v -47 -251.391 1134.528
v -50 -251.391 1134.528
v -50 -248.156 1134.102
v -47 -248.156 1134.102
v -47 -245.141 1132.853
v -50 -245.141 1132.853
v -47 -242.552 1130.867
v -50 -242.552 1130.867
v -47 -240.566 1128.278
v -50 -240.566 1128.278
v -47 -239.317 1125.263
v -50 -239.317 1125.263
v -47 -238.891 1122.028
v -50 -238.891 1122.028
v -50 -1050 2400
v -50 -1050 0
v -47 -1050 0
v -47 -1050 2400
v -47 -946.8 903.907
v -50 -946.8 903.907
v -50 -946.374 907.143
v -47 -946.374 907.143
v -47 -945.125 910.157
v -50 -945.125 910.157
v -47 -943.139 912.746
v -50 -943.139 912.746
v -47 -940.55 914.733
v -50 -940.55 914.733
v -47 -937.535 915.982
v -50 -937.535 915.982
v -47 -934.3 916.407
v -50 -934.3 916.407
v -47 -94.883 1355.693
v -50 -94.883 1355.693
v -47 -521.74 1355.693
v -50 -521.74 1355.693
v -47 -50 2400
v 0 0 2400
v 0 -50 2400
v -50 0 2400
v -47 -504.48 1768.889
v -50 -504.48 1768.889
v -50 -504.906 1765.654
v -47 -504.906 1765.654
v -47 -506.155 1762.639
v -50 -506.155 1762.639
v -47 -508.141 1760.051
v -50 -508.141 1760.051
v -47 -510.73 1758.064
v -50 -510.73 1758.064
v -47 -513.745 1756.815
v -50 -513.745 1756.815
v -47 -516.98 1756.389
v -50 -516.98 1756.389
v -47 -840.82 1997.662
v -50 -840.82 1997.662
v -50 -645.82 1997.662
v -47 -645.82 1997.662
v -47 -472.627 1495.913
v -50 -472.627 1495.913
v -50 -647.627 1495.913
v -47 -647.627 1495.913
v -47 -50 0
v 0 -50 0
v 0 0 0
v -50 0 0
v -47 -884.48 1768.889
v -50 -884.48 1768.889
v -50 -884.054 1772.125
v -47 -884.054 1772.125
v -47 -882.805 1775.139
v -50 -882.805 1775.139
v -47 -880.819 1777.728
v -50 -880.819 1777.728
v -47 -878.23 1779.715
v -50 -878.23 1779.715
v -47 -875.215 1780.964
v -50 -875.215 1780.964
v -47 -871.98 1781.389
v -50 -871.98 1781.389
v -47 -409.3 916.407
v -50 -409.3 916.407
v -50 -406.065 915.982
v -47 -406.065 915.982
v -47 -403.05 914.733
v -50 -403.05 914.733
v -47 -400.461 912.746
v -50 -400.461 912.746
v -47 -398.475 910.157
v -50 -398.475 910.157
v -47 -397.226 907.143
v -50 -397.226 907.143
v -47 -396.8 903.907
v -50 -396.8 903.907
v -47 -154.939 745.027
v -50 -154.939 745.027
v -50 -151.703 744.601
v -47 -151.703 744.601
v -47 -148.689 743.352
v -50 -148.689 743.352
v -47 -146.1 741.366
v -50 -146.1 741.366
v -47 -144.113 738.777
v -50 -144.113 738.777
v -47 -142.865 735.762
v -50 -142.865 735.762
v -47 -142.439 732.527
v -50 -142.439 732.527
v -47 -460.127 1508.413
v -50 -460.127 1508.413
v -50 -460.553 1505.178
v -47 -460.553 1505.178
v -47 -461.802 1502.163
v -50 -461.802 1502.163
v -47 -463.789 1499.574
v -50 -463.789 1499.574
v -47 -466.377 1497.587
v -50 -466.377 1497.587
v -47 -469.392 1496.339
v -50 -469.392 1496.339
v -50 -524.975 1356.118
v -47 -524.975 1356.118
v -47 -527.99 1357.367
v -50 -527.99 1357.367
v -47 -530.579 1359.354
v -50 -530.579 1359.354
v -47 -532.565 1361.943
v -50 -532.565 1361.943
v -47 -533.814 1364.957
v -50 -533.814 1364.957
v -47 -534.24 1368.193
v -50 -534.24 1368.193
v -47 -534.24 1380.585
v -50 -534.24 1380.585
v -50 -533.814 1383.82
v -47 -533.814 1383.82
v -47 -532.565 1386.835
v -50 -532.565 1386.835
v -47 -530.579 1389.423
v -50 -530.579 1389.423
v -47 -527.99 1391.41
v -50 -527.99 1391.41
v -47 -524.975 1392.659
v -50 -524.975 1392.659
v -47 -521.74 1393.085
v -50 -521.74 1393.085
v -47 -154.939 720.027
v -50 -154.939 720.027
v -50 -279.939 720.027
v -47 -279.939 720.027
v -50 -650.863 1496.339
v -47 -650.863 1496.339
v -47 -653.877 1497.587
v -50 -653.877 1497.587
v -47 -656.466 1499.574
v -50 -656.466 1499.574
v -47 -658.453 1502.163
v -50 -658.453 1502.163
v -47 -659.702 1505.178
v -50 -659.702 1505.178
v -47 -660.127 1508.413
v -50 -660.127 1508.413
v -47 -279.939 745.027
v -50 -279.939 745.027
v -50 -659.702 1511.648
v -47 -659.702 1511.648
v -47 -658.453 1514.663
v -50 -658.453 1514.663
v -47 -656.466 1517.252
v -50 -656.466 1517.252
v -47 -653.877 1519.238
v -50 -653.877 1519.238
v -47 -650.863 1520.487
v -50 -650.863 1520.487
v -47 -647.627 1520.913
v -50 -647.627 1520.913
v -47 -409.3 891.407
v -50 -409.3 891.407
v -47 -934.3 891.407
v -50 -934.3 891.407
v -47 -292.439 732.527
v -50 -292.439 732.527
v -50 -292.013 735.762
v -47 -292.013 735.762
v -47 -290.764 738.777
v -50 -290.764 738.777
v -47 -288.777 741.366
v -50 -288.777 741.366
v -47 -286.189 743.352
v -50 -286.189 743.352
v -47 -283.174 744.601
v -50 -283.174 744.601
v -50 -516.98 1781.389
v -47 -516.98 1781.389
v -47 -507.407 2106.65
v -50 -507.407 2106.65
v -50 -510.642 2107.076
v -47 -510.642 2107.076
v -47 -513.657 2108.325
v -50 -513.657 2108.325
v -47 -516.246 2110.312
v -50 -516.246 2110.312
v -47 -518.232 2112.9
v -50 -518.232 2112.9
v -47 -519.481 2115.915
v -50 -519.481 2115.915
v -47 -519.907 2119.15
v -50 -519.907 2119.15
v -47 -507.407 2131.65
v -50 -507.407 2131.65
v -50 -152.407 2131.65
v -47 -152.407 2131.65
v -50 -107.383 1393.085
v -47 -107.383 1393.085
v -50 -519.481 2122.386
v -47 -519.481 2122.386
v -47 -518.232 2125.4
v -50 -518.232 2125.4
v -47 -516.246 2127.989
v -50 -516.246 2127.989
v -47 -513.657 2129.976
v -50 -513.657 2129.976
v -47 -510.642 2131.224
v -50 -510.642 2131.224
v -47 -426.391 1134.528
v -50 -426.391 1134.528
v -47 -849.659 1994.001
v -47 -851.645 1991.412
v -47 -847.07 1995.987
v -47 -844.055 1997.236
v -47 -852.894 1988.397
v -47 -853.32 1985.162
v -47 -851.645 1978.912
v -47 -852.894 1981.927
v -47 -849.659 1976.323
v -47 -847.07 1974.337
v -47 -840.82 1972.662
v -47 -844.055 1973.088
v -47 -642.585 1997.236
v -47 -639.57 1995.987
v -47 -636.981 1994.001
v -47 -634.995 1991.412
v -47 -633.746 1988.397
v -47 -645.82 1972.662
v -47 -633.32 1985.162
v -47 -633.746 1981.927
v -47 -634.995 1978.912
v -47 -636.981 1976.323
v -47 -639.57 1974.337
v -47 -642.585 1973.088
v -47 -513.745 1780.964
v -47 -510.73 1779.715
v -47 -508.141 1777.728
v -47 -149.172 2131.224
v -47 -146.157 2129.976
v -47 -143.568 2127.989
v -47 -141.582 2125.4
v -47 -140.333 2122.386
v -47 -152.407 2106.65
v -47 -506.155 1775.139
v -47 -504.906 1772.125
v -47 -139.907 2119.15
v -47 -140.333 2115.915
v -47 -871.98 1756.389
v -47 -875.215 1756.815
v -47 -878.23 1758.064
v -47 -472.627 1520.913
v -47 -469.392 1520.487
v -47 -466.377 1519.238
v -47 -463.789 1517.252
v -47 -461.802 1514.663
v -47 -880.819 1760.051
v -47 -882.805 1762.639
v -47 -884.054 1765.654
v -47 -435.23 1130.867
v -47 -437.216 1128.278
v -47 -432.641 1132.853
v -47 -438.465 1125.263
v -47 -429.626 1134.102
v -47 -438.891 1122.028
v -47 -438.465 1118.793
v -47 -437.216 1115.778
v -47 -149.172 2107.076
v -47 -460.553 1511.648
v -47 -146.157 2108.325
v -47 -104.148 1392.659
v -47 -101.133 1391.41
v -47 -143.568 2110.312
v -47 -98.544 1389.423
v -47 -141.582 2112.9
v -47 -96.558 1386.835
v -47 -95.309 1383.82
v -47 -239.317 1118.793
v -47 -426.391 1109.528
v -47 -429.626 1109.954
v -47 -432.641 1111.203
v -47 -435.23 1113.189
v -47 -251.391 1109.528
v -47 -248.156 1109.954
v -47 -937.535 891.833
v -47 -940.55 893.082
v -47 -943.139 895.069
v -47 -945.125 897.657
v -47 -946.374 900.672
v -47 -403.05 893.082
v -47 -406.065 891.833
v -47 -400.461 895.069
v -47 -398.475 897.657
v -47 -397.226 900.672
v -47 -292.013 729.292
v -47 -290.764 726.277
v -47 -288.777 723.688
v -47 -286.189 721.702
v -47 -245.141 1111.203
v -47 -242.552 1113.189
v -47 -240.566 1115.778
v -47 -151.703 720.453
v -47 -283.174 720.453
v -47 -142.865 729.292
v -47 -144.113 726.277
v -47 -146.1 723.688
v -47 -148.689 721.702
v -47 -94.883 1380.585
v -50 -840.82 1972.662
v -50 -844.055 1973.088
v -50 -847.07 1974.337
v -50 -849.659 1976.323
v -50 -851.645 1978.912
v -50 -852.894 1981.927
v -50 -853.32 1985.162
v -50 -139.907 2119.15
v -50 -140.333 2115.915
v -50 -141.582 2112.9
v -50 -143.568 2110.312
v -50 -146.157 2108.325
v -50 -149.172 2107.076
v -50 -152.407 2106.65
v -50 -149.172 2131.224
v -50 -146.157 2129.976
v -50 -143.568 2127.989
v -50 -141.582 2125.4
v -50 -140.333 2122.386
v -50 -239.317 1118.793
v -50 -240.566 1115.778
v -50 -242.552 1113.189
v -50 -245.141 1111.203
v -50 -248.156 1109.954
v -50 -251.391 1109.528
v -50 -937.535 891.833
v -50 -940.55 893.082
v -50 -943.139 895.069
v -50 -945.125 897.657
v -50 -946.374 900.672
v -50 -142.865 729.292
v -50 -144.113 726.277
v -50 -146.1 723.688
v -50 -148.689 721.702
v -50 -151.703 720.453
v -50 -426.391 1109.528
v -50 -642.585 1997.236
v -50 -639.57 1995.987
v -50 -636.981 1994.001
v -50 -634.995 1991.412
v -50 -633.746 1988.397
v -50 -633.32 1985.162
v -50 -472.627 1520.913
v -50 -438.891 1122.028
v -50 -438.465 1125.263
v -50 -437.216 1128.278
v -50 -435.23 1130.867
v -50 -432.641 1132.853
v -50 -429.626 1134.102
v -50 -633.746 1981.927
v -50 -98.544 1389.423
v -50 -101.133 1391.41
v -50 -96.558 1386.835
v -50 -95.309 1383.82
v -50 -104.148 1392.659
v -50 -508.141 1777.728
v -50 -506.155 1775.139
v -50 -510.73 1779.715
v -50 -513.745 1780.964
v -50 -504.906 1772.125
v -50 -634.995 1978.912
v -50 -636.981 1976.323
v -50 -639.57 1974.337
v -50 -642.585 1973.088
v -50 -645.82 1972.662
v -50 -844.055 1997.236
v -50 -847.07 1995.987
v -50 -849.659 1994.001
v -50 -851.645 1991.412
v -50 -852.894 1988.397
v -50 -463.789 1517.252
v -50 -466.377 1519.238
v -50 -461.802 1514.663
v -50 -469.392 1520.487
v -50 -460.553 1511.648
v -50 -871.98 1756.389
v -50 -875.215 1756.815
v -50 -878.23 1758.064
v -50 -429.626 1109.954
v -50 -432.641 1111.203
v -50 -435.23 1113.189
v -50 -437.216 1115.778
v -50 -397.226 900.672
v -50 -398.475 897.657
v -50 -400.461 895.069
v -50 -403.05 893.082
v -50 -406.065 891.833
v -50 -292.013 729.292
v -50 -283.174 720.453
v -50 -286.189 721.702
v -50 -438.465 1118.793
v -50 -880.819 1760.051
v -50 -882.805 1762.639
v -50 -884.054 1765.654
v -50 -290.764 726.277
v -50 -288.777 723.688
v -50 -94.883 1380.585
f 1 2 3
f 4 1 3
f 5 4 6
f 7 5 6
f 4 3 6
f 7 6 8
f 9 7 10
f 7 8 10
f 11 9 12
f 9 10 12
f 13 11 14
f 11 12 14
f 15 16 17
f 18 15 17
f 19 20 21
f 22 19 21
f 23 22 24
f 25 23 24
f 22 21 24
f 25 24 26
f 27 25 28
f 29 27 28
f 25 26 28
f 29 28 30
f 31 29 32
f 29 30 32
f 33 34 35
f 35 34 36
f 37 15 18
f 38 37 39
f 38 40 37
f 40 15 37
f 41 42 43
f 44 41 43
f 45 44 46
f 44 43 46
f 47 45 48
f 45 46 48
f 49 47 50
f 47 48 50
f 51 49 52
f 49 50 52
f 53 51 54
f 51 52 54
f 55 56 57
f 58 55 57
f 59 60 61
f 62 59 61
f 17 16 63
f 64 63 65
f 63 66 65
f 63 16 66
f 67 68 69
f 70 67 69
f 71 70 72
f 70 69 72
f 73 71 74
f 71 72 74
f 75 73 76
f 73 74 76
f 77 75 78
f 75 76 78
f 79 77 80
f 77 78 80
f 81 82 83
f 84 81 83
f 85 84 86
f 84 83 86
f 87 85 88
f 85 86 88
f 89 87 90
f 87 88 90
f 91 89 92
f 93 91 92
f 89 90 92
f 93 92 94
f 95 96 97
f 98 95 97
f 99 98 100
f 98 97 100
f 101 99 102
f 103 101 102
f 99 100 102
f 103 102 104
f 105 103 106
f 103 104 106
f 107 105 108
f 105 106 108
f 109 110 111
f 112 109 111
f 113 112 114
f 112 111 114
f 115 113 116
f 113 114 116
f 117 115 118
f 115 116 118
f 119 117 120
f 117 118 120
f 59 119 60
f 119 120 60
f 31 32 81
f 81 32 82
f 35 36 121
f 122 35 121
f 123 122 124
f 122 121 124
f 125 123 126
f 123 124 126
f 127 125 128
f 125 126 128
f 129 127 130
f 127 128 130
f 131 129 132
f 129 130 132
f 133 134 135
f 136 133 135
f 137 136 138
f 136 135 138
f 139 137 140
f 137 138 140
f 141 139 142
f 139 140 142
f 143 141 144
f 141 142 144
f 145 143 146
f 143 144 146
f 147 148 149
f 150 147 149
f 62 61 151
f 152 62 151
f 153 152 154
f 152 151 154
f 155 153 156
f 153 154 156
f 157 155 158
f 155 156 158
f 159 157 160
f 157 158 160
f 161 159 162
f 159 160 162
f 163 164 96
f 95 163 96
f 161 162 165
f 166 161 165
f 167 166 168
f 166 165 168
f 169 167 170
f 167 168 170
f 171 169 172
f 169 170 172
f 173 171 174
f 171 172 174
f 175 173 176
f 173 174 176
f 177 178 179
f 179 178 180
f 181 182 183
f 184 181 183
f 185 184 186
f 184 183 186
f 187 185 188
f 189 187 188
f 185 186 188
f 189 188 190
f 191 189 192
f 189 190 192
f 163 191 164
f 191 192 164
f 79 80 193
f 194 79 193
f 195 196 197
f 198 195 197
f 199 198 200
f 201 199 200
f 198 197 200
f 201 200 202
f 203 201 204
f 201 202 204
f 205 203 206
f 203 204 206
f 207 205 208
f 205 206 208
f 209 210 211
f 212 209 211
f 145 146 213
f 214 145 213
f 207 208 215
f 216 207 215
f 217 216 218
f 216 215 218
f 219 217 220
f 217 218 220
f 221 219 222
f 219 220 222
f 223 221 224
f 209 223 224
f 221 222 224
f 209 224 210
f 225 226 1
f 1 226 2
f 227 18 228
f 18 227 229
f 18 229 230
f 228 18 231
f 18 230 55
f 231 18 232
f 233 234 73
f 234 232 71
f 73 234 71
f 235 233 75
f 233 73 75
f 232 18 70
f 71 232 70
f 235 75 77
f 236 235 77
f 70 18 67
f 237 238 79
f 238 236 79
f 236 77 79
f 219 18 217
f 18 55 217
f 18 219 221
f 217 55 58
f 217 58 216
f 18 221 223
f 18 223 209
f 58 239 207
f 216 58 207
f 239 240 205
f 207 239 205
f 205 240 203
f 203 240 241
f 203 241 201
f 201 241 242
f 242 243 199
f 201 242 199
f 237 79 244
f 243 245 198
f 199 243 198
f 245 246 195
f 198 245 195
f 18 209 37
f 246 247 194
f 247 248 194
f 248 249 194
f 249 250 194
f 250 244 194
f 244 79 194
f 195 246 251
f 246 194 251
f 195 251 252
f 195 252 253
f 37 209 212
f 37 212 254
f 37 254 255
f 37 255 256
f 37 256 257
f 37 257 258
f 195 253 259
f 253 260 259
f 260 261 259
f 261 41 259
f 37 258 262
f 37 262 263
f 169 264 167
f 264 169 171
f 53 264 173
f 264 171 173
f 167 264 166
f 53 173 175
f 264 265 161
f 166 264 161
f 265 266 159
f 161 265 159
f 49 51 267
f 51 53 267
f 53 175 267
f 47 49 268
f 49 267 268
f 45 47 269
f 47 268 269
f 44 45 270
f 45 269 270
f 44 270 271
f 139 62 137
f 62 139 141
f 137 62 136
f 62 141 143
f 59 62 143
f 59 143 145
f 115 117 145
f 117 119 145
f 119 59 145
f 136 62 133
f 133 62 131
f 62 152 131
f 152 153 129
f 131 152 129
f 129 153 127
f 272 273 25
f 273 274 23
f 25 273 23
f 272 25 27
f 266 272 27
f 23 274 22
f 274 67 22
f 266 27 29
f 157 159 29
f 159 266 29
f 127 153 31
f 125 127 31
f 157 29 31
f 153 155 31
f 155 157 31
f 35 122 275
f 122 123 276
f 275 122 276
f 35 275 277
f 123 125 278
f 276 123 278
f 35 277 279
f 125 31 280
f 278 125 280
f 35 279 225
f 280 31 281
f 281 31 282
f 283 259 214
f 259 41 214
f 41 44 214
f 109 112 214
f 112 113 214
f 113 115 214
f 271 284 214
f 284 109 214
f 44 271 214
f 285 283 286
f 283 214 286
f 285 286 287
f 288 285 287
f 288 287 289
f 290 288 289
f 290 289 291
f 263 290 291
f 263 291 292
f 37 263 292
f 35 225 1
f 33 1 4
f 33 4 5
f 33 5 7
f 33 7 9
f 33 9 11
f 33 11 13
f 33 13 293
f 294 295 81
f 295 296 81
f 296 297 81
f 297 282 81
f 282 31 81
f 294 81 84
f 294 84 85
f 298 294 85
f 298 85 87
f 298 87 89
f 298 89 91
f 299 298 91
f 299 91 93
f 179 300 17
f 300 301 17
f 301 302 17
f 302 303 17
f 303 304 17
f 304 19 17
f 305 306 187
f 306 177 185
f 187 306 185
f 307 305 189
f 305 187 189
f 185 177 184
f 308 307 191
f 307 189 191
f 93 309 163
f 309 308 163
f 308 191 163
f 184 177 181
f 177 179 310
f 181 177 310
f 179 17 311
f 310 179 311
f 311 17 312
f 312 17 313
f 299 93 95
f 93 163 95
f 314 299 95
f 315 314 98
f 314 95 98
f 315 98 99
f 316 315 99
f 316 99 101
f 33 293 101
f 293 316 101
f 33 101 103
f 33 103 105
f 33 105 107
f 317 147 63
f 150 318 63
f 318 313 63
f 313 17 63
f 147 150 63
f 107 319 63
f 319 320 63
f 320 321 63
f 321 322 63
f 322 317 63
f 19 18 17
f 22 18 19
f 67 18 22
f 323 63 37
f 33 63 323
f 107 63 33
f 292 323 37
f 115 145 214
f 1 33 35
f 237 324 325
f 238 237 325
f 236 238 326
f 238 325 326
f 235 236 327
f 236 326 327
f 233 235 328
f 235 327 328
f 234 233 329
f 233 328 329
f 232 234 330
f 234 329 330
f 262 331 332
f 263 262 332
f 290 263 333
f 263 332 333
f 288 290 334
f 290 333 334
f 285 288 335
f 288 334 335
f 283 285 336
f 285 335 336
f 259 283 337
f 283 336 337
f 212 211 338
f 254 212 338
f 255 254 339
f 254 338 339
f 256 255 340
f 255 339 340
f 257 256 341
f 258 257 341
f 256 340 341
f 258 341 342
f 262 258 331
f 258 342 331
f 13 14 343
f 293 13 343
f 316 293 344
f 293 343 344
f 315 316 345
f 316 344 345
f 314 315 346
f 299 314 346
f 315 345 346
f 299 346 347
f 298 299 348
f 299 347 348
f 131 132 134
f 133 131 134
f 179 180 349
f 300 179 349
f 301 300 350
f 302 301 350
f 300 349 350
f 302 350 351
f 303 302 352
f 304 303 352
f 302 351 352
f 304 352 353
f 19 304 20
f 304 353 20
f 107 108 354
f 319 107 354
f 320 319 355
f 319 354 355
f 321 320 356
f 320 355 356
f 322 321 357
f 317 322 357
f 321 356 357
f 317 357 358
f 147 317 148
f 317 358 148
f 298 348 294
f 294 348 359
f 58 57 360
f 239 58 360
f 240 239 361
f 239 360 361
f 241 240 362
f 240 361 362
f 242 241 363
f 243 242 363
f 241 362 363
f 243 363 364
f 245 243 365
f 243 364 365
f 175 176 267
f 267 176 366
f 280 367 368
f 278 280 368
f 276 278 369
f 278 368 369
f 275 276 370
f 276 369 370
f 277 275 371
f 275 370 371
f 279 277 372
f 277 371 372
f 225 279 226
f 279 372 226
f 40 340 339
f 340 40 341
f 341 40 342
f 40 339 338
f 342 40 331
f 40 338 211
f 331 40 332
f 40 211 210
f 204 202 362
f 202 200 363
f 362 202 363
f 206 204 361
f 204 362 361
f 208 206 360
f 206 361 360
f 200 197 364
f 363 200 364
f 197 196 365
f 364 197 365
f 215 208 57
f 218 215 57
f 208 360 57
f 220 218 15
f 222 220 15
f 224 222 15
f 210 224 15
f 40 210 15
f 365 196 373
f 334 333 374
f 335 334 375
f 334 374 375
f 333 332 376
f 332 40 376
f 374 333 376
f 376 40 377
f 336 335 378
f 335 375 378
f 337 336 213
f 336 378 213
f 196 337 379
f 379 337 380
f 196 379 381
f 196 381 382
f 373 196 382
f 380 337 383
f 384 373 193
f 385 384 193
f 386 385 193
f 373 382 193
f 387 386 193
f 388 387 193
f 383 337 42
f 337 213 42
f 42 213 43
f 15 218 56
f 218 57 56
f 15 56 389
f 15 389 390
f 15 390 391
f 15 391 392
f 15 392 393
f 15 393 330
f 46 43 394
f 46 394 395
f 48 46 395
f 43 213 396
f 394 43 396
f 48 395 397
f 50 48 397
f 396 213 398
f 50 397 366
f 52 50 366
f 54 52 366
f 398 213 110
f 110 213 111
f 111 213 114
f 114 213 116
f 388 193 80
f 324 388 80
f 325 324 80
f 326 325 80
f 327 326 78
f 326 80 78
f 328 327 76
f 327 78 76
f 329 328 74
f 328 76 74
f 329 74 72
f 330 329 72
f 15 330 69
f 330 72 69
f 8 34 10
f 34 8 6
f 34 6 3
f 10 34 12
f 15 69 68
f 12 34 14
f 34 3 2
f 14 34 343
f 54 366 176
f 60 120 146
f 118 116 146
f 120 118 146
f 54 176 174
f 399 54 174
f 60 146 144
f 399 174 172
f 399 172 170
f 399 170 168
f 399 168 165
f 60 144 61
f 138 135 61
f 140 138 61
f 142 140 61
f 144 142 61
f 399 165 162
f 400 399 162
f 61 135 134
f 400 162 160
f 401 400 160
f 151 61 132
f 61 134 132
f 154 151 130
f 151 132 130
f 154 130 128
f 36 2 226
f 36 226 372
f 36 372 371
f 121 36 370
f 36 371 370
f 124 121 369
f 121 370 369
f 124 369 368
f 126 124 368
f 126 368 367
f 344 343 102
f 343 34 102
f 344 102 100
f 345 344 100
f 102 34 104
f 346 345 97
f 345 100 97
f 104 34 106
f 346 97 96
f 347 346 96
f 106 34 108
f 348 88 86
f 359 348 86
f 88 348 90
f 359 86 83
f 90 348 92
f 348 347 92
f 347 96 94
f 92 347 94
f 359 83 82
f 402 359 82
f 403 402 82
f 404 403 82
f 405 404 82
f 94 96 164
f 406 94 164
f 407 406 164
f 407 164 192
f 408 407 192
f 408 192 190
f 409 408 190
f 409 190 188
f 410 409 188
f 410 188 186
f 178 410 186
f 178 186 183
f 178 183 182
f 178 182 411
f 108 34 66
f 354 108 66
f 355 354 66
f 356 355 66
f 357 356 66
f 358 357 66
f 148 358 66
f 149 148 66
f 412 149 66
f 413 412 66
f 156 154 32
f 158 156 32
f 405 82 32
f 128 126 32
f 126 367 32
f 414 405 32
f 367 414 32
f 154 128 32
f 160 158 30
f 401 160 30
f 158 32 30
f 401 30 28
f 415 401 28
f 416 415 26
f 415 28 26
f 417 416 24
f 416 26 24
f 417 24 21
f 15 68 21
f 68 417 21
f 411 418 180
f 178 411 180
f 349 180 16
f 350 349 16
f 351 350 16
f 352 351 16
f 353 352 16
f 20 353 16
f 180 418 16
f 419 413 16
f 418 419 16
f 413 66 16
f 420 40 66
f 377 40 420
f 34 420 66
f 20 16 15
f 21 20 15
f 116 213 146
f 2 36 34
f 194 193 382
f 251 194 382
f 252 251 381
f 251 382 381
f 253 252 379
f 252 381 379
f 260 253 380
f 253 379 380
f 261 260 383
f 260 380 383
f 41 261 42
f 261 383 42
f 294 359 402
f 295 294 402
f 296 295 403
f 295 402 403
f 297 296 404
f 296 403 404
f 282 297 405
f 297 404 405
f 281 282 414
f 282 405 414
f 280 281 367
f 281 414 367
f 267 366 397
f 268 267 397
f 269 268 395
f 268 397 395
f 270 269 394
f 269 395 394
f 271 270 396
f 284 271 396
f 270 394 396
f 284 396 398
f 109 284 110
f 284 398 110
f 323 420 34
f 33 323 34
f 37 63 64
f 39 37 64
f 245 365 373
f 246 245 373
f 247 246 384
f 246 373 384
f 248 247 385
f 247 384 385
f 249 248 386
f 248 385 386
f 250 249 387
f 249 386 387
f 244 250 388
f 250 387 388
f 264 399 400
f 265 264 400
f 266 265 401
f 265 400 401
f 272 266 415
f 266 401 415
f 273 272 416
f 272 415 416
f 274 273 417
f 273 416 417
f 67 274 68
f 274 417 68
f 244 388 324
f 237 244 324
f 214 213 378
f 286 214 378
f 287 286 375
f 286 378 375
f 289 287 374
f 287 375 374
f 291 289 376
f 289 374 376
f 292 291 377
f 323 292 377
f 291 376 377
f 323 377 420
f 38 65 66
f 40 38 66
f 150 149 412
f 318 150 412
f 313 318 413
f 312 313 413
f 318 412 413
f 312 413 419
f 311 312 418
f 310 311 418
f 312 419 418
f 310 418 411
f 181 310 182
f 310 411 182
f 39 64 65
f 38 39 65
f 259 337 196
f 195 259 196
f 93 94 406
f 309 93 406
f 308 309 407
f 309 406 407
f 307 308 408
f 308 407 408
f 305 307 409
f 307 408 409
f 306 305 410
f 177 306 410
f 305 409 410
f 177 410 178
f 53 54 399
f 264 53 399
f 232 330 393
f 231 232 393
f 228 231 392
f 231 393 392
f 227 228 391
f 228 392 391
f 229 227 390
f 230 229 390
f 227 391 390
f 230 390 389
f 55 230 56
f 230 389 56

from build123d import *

# Parameters (mm, degrees)
F0_W     = 3
F0_H     = 1000
F1_DEPTH = 2400
F3_DEPTH = 25


with BuildPart() as f1:
    # F0 (on Top) → F1 (new body)
    with BuildSketch(Plane.XY):
        Polygon((0, -50), (0, 0), (-50, 0), (-50, -50), (-47, -50), align=None)
        with Locations((-48.5, -550)):
            Rectangle(F0_W, F0_H)
    extrude(amount=F1_DEPTH)

    # F2 (on face) → F3 (cut)
    with BuildSketch(Plane(origin=(-50, 0, 0), x_dir=(0, -1, 0), z_dir=(-1, 0, 0))):
        with BuildLine():
            Line((507.407176, 2131.650352), (152.407176, 2131.650352))
            ThreePointArc((152.407176, 2131.650352), (143.568342, 2127.989187), (139.907176, 2119.150352))
            ThreePointArc((139.907176, 2119.150352), (143.568342, 2110.311518), (152.407176, 2106.650352))
            Line((152.407176, 2106.650352), (507.407176, 2106.650352))
            ThreePointArc((507.407176, 2106.650352), (516.246011, 2110.311518), (519.907176, 2119.150352))
            ThreePointArc((519.907176, 2119.150352), (516.246011, 2127.989187), (507.407176, 2131.650352))
        make_face()
        with BuildLine():
            Line((871.98, 1781.389432), (516.98, 1781.389432))
            ThreePointArc((516.98, 1781.389432), (508.141165, 1777.728267), (504.48, 1768.889432))
            ThreePointArc((504.48, 1768.889432), (508.141165, 1760.050597), (516.98, 1756.389432))
            Line((516.98, 1756.389432), (871.98, 1756.389432))
            ThreePointArc((871.98, 1756.389432), (880.818834, 1760.050597), (884.48, 1768.889432))
            ThreePointArc((884.48, 1768.889432), (880.818834, 1777.728267), (871.98, 1781.389432))
        make_face()
        with BuildLine():
            Line((647.627461, 1520.91279), (472.627461, 1520.91279))
            ThreePointArc((472.627461, 1520.91279), (463.788626, 1517.251625), (460.127461, 1508.41279))
            ThreePointArc((460.127461, 1508.41279), (463.788626, 1499.573956), (472.627461, 1495.91279))
            Line((472.627461, 1495.91279), (647.627461, 1495.91279))
            ThreePointArc((647.627461, 1495.91279), (656.466296, 1499.573956), (660.127461, 1508.41279))
            ThreePointArc((660.127461, 1508.41279), (656.466296, 1517.251625), (647.627461, 1520.91279))
        make_face()
        with BuildLine():
            Line((426.390964, 1134.527946), (251.390964, 1134.527946))
            ThreePointArc((251.390964, 1134.527946), (242.552129, 1130.86678), (238.890964, 1122.027946))
            ThreePointArc((238.890964, 1122.027946), (242.552129, 1113.189111), (251.390964, 1109.527946))
            Line((251.390964, 1109.527946), (426.390964, 1109.527946))
            ThreePointArc((426.390964, 1109.527946), (435.229799, 1113.189111), (438.890964, 1122.027946))
            ThreePointArc((438.890964, 1122.027946), (435.229799, 1130.86678), (426.390964, 1134.527946))
        make_face()
        with BuildLine():
            Line((934.300172, 916.40743), (409.300172, 916.40743))
            ThreePointArc((409.300172, 916.40743), (400.461338, 912.746265), (396.800172, 903.90743))
            ThreePointArc((396.800172, 903.90743), (400.461338, 895.068595), (409.300172, 891.40743))
            Line((409.300172, 891.40743), (934.300172, 891.40743))
            ThreePointArc((934.300172, 891.40743), (943.139007, 895.068595), (946.800172, 903.90743))
            ThreePointArc((946.800172, 903.90743), (943.139007, 912.746265), (934.300172, 916.40743))
        make_face()
        with BuildLine():
            Line((279.938626, 745.02703), (154.938626, 745.02703))
            ThreePointArc((154.938626, 745.02703), (146.099792, 741.365864), (142.438626, 732.52703))
            ThreePointArc((142.438626, 732.52703), (146.099792, 723.688195), (154.938626, 720.02703))
            Line((154.938626, 720.02703), (279.938626, 720.02703))
            ThreePointArc((279.938626, 720.02703), (288.777461, 723.688195), (292.438626, 732.52703))
            ThreePointArc((292.438626, 732.52703), (288.777461, 741.365864), (279.938626, 745.02703))
        make_face()
        with BuildLine():
            Line((840.819943, 1997.661972), (645.819943, 1997.661972))
            ThreePointArc((645.819943, 1997.661972), (636.981108, 1994.000807), (633.319943, 1985.161972))
            ThreePointArc((633.319943, 1985.161972), (636.981108, 1976.323137), (645.819943, 1972.661972))
            Line((645.819943, 1972.661972), (840.819943, 1972.661972))
            ThreePointArc((840.819943, 1972.661972), (849.658778, 1976.323137), (853.319943, 1985.161972))
            ThreePointArc((853.319943, 1985.161972), (849.658778, 1994.000807), (840.819943, 1997.661972))
        make_face()
        with BuildLine():
            Line((521.740067, 1393.084645), (107.383054, 1393.084645))
            ThreePointArc((107.383054, 1393.084645), (98.54422, 1389.42348), (94.883054, 1380.584645))
            Line((94.883054, 1380.584645), (94.883054, 1355.692506))
            Line((94.883054, 1355.692506), (521.740067, 1355.692506))
            ThreePointArc((521.740067, 1355.692506), (530.578902, 1359.353671), (534.240067, 1368.192506))
            Line((534.240067, 1368.192506), (534.240067, 1380.584645))
            ThreePointArc((534.240067, 1380.584645), (530.578902, 1389.42348), (521.740067, 1393.084645))
        make_face()
    extrude(amount=-F3_DEPTH, mode=Mode.SUBTRACT)


solid = f1.part
